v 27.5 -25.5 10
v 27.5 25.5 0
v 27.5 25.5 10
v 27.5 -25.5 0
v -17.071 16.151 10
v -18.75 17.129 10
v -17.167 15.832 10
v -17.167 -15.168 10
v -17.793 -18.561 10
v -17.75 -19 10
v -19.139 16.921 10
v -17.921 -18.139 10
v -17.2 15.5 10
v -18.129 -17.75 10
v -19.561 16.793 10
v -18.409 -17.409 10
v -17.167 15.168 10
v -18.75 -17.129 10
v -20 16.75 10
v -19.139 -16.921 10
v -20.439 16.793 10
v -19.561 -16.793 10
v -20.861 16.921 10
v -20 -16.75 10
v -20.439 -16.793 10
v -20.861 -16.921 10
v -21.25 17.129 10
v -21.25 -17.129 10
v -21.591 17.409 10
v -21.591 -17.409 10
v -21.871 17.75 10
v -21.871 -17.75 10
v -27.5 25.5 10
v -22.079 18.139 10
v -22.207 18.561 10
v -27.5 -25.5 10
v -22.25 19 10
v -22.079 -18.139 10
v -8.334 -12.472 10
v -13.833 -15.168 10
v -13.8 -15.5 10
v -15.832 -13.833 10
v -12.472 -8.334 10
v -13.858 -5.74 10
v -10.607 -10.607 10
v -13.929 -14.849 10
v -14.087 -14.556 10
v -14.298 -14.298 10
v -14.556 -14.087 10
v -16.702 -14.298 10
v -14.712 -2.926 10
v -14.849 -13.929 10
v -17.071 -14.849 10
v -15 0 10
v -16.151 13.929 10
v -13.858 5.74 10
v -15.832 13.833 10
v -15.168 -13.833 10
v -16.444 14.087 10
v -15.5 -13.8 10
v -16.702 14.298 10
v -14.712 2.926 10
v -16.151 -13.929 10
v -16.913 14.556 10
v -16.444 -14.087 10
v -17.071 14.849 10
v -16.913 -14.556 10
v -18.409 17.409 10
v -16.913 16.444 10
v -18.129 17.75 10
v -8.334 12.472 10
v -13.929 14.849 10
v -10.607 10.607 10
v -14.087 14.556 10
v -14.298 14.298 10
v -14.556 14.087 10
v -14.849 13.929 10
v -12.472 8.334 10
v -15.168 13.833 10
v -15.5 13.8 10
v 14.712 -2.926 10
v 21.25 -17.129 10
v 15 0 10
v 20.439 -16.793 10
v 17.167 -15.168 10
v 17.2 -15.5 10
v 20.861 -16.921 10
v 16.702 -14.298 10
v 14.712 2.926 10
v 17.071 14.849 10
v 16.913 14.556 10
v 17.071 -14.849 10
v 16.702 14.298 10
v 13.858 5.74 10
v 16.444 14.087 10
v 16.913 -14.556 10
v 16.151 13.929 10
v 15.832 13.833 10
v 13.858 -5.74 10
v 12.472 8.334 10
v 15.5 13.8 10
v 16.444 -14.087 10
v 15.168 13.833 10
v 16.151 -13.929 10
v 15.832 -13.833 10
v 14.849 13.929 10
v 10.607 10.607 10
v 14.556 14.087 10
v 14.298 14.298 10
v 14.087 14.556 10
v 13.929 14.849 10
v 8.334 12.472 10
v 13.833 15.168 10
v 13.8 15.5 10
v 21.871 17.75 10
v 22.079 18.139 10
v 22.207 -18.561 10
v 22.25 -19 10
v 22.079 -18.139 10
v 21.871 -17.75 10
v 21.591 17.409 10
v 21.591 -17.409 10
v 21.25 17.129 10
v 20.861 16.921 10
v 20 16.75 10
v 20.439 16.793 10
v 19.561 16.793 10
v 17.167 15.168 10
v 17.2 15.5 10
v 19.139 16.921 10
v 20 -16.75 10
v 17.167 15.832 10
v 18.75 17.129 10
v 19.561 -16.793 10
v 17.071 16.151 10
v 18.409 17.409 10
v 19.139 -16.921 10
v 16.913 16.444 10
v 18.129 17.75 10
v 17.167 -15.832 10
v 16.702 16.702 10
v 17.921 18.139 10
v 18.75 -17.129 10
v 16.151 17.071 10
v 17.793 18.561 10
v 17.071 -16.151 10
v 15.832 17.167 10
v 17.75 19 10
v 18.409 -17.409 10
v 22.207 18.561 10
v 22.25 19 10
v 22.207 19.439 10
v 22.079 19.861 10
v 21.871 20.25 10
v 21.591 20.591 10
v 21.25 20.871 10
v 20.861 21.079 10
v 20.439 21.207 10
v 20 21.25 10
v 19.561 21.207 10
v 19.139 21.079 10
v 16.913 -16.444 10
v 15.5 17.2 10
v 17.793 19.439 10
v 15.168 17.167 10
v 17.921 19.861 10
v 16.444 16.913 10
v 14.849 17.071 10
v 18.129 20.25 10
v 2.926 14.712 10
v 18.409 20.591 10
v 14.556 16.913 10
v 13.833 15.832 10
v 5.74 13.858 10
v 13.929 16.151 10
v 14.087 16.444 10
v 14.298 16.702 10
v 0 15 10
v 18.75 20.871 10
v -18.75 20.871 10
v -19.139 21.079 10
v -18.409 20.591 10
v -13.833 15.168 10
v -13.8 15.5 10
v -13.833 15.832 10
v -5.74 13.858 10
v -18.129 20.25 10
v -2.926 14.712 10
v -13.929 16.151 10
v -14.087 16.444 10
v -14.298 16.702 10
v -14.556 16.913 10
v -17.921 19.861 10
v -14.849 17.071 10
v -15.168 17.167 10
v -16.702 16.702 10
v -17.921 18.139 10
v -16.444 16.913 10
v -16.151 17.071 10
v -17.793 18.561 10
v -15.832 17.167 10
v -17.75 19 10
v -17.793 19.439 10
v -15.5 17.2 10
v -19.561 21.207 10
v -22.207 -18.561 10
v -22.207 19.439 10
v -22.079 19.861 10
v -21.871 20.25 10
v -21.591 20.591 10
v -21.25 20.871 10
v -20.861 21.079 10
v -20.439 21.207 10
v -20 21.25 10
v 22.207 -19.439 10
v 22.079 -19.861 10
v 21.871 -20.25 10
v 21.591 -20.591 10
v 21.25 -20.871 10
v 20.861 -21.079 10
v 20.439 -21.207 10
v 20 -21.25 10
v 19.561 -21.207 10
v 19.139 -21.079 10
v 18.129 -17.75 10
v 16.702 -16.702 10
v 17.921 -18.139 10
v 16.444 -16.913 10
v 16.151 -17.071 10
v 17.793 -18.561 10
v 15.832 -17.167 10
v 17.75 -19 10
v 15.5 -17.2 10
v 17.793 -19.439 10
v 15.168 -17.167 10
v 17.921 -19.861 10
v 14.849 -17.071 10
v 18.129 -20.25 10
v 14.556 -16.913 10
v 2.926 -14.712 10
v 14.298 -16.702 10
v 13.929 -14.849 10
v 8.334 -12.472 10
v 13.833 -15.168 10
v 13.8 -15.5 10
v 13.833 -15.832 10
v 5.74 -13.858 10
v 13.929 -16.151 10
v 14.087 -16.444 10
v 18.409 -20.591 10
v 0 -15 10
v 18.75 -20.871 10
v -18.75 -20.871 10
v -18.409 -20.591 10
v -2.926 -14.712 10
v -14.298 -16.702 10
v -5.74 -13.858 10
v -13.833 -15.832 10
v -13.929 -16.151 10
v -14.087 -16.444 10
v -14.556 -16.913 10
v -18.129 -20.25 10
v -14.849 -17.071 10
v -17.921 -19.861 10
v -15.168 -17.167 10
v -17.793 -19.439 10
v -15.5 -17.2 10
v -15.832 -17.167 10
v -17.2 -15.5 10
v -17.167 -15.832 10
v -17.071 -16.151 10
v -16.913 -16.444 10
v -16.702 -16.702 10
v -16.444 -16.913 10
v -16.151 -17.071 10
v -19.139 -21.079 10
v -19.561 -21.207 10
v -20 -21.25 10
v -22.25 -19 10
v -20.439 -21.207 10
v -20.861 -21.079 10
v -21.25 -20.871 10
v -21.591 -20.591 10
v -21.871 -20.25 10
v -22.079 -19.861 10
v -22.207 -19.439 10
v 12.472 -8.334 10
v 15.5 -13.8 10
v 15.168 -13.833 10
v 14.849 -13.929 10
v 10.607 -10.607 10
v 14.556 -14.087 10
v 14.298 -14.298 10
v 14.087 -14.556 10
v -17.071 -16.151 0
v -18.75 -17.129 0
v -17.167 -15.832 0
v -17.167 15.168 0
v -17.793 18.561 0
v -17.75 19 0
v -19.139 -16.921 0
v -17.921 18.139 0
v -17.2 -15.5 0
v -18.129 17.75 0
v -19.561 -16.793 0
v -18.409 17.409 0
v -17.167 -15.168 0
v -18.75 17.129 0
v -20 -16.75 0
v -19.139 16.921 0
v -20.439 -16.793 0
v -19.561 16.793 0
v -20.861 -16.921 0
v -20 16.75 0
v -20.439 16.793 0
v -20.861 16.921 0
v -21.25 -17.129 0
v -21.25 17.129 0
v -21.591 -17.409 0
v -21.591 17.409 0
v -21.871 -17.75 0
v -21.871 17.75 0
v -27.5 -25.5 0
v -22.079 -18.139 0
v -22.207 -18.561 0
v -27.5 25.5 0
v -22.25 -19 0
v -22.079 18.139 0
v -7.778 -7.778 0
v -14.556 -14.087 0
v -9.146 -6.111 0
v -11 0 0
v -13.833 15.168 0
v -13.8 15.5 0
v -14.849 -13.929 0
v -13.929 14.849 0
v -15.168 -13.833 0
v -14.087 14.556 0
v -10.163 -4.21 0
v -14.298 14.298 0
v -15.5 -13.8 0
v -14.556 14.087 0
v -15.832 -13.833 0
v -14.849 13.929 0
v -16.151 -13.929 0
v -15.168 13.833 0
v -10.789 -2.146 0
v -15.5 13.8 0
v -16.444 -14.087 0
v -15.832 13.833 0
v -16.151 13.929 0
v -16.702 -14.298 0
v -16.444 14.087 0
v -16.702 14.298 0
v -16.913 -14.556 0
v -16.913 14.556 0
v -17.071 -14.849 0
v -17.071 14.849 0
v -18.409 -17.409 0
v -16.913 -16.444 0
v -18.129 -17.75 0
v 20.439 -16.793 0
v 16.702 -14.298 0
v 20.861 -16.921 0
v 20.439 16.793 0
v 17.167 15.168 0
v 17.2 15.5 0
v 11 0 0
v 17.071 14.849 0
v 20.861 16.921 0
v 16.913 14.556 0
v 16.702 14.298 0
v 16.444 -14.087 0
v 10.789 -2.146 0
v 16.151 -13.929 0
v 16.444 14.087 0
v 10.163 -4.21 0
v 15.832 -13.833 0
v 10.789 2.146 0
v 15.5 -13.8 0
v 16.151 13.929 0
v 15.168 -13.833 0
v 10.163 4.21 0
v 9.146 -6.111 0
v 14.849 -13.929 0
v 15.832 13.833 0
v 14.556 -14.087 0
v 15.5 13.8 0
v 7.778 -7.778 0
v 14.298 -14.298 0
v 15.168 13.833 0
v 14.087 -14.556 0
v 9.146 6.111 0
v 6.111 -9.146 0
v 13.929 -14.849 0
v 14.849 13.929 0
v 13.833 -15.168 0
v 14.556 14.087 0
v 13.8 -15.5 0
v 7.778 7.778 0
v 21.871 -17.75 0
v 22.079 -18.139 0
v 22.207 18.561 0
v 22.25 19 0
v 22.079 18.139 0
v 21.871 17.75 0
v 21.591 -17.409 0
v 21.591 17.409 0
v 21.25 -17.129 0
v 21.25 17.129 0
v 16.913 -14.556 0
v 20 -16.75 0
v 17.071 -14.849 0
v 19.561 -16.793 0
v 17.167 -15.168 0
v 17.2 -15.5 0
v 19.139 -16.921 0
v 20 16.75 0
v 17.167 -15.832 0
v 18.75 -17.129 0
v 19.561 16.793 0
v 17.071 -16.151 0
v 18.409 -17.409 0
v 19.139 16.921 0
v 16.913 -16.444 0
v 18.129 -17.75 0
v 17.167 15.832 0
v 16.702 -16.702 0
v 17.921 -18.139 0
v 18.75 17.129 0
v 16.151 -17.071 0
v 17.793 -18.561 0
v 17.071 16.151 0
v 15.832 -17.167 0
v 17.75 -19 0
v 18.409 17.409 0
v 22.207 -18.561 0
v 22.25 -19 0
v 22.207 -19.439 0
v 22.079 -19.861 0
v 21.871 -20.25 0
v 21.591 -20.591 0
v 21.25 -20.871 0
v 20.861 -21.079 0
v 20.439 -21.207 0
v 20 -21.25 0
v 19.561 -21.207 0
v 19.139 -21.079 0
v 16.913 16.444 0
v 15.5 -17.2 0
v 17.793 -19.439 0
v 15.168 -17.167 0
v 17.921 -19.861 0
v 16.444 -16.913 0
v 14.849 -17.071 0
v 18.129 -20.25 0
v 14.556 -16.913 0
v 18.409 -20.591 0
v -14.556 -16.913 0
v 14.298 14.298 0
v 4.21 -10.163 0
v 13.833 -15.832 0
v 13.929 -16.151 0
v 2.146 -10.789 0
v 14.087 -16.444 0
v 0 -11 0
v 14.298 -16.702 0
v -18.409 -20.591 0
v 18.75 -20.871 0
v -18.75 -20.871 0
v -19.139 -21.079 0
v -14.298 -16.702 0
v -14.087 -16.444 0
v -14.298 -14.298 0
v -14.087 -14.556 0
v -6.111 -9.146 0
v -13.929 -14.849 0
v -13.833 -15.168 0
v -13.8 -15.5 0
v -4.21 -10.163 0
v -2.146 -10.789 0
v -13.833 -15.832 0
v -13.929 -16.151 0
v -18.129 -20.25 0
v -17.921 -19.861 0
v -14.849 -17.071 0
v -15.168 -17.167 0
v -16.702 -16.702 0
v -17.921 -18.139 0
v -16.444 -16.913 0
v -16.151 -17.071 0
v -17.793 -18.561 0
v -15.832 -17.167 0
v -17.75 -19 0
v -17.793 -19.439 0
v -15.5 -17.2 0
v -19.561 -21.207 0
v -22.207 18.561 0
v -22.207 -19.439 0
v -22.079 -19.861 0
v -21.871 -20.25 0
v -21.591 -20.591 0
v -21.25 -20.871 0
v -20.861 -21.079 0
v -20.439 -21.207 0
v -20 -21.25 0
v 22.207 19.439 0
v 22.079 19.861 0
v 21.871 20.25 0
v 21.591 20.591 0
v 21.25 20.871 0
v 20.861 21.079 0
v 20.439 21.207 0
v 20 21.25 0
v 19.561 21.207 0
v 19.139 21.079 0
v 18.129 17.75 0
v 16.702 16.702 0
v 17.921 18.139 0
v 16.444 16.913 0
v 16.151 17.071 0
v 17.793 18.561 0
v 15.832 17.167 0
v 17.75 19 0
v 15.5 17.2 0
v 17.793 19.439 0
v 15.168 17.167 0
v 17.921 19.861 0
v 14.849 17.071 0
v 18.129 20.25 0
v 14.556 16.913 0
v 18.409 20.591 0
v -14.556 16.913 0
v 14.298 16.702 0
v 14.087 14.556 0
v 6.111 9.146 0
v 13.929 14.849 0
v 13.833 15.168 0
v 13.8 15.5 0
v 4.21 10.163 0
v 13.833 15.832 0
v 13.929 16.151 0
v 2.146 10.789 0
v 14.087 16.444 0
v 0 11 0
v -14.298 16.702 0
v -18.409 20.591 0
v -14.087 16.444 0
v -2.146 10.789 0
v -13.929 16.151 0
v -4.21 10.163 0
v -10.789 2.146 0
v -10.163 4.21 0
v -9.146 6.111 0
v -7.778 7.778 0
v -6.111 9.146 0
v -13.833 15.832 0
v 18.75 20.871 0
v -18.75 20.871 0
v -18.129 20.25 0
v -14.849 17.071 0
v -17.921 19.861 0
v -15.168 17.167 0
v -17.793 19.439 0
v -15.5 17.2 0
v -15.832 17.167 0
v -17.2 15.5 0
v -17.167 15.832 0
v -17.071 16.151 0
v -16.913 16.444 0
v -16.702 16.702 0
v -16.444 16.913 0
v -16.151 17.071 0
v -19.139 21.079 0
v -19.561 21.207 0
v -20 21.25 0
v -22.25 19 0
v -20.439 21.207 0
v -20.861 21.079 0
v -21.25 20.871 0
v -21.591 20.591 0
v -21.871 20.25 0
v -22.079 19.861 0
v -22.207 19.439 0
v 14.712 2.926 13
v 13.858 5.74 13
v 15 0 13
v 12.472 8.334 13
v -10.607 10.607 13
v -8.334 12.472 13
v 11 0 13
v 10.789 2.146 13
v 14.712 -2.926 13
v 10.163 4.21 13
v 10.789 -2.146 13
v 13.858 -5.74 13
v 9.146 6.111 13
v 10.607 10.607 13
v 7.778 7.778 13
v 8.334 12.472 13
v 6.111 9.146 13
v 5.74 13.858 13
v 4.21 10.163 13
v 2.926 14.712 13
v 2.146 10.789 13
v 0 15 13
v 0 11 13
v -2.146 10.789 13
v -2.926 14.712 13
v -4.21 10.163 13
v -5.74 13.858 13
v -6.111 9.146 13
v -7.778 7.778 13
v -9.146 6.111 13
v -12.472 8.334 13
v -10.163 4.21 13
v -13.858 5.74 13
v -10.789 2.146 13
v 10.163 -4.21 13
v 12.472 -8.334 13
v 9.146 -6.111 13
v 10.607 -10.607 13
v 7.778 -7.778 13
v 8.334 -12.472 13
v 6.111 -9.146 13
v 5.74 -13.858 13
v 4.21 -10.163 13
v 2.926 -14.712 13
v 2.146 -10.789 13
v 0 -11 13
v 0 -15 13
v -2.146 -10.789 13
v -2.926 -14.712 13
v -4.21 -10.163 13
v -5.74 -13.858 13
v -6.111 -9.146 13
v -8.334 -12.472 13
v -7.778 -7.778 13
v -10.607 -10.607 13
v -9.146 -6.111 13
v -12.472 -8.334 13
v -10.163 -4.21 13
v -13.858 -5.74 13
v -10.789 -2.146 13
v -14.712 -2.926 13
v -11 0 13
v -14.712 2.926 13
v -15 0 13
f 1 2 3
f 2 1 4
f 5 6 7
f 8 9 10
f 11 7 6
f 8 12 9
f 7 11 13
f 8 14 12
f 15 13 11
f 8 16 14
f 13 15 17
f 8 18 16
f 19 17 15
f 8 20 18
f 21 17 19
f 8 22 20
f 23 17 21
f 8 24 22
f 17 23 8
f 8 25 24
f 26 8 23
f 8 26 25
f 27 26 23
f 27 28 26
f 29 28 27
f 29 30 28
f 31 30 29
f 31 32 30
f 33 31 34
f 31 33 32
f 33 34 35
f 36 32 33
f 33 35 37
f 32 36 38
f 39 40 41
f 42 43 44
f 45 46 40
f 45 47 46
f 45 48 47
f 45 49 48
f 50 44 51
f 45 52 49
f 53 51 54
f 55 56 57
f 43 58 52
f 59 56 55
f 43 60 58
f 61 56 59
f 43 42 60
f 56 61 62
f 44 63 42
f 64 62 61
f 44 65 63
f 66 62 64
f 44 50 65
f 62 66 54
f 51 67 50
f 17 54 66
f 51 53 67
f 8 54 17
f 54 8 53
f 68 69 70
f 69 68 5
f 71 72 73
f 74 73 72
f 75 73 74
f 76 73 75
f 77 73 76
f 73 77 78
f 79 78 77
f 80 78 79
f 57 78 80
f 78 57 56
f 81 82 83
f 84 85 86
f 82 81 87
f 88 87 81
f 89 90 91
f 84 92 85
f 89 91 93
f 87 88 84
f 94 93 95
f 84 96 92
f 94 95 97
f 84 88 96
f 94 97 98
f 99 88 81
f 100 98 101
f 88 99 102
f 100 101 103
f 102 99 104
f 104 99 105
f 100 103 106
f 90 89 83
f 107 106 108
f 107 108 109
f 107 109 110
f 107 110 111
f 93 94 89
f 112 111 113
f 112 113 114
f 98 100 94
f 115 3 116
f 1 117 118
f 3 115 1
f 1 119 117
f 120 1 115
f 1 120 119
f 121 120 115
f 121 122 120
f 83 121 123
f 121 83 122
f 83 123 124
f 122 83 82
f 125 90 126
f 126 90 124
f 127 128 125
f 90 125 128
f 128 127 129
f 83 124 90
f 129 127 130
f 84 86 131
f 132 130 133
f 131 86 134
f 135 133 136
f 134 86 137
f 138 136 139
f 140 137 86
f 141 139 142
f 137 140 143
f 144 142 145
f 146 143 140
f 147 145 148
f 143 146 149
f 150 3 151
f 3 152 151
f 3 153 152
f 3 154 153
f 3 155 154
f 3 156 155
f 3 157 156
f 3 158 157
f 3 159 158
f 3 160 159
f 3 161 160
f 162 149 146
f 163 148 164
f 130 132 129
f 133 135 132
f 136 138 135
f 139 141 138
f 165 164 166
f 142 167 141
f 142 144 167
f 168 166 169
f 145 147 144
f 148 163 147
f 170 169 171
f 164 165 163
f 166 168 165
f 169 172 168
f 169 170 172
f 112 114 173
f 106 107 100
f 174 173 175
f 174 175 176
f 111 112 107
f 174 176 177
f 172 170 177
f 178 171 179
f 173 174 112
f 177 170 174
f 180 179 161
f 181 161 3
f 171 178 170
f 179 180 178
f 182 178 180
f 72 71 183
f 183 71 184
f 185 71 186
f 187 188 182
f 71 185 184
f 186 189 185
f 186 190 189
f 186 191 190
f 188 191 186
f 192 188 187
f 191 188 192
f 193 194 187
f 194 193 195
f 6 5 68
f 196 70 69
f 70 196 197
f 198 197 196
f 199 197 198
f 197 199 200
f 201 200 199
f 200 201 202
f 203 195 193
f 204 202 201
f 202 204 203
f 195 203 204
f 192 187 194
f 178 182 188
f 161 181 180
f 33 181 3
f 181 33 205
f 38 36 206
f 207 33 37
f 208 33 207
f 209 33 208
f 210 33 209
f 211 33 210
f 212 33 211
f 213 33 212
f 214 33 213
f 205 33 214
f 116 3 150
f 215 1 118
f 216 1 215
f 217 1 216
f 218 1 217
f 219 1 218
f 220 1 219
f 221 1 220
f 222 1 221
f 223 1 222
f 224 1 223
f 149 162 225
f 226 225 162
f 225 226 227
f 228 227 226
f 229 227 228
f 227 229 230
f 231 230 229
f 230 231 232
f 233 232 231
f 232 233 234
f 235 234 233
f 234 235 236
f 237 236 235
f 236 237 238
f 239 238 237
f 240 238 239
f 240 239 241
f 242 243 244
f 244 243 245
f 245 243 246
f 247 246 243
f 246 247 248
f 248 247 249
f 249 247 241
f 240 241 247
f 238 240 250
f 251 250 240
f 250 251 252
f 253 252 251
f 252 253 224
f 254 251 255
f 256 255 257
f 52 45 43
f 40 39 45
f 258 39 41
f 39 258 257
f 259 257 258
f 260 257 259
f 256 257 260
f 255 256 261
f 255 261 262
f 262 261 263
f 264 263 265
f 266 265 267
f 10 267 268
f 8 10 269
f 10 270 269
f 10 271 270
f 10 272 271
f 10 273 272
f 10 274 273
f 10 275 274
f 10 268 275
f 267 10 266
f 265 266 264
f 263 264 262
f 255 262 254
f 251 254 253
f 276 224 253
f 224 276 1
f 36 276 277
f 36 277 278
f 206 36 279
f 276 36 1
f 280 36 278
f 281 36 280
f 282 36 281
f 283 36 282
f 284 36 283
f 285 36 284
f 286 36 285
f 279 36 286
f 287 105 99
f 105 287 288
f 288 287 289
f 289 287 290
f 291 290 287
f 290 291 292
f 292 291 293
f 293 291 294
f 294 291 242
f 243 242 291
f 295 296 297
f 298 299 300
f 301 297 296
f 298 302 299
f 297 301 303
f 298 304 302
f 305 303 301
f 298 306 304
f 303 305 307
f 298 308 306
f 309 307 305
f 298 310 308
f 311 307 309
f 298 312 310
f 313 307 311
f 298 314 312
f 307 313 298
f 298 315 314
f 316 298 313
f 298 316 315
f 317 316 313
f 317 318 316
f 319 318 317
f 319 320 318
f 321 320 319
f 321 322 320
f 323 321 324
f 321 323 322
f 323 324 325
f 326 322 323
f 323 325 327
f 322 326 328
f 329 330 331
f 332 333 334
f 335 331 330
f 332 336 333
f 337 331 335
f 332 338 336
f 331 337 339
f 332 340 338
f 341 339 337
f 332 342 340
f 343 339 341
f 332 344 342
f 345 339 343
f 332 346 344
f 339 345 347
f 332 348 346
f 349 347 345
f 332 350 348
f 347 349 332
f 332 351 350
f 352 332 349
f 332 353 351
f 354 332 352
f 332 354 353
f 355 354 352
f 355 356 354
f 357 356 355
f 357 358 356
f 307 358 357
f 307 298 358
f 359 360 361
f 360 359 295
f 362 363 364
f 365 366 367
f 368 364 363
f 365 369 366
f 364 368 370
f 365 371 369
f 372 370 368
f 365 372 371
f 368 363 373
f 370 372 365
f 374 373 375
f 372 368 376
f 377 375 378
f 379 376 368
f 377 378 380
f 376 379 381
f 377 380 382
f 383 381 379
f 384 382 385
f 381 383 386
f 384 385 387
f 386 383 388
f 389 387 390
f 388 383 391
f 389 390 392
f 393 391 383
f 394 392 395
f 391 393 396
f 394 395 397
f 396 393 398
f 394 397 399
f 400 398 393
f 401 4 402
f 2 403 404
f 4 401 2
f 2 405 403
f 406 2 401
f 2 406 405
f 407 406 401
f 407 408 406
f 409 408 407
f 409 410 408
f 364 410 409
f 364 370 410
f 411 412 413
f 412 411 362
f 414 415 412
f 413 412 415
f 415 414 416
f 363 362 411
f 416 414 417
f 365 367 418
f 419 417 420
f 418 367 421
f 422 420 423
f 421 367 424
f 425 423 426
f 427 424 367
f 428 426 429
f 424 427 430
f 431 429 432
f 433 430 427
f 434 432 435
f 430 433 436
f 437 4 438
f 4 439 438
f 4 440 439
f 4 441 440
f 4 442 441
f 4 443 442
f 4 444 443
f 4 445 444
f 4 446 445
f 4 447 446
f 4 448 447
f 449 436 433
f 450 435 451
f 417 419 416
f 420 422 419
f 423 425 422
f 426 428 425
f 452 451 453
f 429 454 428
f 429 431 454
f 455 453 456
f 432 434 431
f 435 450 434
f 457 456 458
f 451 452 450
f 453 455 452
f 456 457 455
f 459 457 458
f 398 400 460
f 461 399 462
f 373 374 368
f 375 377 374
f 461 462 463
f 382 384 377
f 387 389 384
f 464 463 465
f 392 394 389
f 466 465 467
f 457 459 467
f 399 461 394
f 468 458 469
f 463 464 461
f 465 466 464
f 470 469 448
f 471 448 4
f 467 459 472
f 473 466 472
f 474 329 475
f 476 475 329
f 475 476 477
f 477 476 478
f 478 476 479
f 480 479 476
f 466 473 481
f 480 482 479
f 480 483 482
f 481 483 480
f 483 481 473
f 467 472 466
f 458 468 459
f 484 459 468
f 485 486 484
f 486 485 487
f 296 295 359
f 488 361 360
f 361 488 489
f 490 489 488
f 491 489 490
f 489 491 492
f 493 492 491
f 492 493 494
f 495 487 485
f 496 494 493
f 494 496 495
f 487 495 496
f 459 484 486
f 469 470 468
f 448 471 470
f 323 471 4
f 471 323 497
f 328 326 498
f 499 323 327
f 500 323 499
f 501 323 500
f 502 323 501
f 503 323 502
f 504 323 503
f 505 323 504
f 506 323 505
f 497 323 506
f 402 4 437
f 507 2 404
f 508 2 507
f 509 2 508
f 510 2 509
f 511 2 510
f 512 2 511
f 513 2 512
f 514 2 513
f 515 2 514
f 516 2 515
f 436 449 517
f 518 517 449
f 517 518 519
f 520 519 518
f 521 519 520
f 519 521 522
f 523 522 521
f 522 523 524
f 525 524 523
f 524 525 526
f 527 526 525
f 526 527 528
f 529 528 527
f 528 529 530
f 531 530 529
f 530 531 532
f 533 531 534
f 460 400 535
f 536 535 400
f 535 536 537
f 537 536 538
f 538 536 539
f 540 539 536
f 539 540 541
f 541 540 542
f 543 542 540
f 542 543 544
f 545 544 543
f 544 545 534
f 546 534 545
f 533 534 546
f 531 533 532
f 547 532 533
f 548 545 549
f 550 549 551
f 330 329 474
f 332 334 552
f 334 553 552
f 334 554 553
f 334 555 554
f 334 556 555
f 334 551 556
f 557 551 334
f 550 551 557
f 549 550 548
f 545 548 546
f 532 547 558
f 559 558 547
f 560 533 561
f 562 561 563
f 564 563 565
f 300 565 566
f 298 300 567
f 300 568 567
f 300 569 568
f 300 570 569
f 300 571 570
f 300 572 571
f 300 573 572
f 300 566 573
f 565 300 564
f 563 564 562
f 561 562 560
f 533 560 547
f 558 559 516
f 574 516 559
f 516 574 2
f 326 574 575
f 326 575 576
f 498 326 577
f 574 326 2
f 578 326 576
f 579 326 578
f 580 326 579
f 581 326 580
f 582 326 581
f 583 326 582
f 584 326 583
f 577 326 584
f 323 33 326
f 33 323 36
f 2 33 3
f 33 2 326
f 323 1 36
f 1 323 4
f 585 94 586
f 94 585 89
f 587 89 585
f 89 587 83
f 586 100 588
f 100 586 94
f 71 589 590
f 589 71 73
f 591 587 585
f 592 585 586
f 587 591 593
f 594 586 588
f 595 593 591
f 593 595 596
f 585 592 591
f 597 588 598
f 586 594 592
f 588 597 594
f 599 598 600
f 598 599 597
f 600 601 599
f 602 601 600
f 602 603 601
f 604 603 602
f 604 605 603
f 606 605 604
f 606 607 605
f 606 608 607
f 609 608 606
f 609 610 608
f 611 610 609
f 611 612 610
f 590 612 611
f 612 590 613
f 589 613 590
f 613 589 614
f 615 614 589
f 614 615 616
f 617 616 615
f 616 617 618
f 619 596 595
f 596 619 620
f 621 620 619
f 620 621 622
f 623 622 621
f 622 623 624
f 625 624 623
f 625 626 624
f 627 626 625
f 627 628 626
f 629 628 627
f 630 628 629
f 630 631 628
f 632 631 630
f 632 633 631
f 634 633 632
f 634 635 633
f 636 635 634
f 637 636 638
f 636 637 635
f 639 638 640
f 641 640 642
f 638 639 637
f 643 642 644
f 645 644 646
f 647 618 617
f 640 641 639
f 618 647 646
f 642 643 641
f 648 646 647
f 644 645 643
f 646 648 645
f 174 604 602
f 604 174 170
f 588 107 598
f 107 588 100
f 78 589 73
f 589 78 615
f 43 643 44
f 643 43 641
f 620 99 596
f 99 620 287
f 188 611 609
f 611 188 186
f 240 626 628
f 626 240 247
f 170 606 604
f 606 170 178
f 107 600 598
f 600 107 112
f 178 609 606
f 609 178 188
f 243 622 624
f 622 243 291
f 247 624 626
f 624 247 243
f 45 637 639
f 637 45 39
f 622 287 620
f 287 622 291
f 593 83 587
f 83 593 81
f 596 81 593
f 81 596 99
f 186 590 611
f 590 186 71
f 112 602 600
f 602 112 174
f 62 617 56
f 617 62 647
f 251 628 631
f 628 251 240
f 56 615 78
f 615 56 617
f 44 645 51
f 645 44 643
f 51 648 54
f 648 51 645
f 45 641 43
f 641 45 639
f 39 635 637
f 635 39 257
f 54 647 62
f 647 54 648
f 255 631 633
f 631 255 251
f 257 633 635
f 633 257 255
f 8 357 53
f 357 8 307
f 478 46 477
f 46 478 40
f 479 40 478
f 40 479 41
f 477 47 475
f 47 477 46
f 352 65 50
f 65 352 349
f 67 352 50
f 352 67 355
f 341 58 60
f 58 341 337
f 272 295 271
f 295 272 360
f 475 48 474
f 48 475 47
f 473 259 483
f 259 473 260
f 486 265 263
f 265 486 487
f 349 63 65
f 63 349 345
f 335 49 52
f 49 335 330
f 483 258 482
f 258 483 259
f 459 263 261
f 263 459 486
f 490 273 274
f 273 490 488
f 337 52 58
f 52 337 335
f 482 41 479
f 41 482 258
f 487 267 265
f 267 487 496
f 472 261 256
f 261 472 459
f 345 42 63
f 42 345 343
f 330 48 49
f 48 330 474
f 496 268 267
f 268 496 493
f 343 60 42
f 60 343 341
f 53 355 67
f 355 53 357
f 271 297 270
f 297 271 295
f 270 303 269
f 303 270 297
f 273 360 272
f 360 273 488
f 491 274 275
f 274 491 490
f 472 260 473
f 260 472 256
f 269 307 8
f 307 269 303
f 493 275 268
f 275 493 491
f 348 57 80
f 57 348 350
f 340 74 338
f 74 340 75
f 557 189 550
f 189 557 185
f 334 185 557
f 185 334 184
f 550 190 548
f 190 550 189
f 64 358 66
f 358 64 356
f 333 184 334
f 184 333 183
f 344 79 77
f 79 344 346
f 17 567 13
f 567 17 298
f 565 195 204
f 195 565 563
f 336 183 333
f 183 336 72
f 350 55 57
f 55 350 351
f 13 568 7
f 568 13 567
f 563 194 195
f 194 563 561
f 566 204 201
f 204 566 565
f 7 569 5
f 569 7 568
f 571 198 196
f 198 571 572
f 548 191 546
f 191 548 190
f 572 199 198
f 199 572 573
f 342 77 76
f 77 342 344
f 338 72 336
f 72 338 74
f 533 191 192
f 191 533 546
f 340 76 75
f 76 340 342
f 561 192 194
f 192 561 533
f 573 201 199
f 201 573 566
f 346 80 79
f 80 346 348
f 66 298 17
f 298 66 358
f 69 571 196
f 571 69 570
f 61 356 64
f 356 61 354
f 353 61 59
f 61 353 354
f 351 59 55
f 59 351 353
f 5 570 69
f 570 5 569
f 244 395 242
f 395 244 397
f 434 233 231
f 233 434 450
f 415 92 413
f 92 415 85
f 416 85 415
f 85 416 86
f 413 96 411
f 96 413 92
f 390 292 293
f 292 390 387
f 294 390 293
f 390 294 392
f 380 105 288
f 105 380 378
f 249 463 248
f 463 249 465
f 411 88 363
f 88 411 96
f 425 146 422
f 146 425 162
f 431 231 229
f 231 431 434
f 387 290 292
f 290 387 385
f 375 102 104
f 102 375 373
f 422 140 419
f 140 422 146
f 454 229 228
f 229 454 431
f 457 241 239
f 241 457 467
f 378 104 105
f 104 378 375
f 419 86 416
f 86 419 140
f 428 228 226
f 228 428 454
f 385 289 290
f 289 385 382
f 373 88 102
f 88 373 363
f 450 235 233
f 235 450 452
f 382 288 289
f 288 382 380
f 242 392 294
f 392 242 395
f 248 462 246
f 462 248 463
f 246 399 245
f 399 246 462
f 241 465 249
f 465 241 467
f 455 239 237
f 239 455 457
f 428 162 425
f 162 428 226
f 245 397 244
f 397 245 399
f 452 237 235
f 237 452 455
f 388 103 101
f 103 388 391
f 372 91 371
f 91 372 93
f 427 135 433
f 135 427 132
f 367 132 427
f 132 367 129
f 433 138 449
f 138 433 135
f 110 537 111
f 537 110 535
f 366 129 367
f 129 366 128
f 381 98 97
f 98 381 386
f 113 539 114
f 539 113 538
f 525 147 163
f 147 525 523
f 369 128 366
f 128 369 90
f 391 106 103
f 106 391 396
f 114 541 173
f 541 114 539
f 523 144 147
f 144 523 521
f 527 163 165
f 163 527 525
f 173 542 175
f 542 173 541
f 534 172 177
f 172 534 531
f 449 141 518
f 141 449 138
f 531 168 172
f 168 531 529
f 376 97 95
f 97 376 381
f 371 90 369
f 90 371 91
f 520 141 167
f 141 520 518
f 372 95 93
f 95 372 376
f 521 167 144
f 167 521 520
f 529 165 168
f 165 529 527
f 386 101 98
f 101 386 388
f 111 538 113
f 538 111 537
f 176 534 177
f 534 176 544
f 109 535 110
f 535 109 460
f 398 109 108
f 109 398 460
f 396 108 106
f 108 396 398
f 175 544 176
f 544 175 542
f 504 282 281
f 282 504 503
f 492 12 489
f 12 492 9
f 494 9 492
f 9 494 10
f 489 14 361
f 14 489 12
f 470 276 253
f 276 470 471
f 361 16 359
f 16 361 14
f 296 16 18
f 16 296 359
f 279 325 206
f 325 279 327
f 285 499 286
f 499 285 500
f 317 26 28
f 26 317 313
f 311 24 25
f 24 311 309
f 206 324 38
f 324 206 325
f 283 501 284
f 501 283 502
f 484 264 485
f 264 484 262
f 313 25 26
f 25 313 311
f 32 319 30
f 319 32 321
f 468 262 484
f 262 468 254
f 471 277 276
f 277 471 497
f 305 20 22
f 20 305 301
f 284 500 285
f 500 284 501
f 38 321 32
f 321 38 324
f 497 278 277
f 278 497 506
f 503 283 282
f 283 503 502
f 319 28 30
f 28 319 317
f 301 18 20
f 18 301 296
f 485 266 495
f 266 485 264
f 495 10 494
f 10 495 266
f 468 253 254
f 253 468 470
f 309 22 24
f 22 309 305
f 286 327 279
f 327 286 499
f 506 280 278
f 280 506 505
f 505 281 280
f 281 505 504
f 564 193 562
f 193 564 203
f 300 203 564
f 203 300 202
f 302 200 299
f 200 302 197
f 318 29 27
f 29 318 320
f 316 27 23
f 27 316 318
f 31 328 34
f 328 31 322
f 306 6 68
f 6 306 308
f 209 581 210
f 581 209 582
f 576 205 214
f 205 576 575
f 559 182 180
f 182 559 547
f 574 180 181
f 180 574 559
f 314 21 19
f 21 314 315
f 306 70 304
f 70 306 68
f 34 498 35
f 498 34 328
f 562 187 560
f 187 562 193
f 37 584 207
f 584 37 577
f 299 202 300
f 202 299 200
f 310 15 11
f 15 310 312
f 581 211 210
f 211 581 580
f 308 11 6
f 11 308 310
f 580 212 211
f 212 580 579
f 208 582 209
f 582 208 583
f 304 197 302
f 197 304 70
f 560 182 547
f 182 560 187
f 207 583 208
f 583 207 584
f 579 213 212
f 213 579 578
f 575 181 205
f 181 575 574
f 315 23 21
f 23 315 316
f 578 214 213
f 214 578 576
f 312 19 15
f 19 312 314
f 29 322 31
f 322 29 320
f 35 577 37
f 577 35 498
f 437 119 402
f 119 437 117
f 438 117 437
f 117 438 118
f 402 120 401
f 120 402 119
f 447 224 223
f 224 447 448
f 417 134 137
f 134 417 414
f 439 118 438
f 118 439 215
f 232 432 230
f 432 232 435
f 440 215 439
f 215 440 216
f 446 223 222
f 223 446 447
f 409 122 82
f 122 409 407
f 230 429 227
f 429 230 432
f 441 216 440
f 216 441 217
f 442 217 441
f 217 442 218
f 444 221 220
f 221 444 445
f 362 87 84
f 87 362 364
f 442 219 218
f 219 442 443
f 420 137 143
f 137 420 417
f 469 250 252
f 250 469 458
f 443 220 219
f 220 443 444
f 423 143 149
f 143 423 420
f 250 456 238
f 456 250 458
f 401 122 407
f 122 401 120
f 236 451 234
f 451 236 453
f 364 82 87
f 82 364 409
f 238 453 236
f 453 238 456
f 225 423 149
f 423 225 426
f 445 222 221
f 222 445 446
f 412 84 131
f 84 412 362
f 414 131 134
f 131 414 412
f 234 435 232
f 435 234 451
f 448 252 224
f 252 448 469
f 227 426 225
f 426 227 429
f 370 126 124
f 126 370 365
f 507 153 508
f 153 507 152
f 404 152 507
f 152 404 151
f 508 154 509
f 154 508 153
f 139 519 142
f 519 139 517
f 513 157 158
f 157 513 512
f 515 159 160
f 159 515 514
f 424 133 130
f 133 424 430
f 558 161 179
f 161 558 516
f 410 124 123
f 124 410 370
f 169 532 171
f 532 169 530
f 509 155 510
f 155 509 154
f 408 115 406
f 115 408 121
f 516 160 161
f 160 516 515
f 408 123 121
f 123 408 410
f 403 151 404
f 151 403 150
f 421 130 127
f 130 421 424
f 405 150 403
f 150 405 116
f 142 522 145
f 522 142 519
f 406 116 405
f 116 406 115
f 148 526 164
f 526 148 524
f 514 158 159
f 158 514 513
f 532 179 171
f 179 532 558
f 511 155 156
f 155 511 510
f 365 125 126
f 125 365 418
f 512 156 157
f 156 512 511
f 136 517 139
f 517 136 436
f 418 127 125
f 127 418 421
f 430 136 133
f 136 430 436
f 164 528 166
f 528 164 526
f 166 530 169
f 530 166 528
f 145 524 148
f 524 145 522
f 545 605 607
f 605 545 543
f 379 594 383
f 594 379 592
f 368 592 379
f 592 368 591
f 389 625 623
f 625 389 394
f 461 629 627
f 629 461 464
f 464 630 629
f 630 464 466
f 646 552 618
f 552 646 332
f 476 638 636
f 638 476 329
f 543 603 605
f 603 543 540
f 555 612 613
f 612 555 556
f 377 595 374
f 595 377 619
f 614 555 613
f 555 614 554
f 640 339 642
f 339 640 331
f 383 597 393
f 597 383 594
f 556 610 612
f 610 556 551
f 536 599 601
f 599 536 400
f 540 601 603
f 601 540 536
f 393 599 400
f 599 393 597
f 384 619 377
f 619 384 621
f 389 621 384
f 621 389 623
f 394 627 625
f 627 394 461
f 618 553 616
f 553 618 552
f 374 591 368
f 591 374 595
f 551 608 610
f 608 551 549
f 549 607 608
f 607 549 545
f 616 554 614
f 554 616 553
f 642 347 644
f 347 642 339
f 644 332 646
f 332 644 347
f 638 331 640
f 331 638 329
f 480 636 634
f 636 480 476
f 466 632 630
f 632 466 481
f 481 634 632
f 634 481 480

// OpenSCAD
$fn = 32;

// ----------------------------------------------------------------------
// Motor mount plate: NEMA17, 55 x 51 x 13 mm
// ----------------------------------------------------------------------

// --- parameters (mm) ---
base_x = 55;              // plate length, X
base_y = 51;              // plate width, Y
thick = 10;               // plate thickness
bolt_pitch = 31;          // NEMA17 bolt spacing
motor_d = 3.4;            // NEMA17 screw clearance
boss_hole = 22;           // pilot boss bore
boss_d = 30;              // raised pilot ring
boss_h = 3;               // raised pilot ring height
second_d = 4.5;           // second fastener hole

module plate() {
  translate([-base_x / 2, -base_y / 2, 0]) cube([base_x, base_y, thick]);
}

module motor_holes() {
  for (sx = [-1, 1]) for (sy = [-1, 1])
    translate([sx * bolt_pitch / 2, sy * bolt_pitch / 2, -1])
      cylinder(h = thick + 2, d = motor_d);
}
module pilot_ring() {
  translate([0, 0, thick - 1]) cylinder(h = boss_h + 1, d = boss_d);
}

difference() {
  union() {
    plate();
    pilot_ring();
  }
  motor_holes();
  translate([0, 0, -1]) cylinder(h = thick + boss_h + 2, d = boss_hole);
  for (sx = [-1, 1]) for (sy = [-1, 1])
    translate([sx * 20, sy * 19, -1]) cylinder(h = thick + 2, d = second_d);
}
